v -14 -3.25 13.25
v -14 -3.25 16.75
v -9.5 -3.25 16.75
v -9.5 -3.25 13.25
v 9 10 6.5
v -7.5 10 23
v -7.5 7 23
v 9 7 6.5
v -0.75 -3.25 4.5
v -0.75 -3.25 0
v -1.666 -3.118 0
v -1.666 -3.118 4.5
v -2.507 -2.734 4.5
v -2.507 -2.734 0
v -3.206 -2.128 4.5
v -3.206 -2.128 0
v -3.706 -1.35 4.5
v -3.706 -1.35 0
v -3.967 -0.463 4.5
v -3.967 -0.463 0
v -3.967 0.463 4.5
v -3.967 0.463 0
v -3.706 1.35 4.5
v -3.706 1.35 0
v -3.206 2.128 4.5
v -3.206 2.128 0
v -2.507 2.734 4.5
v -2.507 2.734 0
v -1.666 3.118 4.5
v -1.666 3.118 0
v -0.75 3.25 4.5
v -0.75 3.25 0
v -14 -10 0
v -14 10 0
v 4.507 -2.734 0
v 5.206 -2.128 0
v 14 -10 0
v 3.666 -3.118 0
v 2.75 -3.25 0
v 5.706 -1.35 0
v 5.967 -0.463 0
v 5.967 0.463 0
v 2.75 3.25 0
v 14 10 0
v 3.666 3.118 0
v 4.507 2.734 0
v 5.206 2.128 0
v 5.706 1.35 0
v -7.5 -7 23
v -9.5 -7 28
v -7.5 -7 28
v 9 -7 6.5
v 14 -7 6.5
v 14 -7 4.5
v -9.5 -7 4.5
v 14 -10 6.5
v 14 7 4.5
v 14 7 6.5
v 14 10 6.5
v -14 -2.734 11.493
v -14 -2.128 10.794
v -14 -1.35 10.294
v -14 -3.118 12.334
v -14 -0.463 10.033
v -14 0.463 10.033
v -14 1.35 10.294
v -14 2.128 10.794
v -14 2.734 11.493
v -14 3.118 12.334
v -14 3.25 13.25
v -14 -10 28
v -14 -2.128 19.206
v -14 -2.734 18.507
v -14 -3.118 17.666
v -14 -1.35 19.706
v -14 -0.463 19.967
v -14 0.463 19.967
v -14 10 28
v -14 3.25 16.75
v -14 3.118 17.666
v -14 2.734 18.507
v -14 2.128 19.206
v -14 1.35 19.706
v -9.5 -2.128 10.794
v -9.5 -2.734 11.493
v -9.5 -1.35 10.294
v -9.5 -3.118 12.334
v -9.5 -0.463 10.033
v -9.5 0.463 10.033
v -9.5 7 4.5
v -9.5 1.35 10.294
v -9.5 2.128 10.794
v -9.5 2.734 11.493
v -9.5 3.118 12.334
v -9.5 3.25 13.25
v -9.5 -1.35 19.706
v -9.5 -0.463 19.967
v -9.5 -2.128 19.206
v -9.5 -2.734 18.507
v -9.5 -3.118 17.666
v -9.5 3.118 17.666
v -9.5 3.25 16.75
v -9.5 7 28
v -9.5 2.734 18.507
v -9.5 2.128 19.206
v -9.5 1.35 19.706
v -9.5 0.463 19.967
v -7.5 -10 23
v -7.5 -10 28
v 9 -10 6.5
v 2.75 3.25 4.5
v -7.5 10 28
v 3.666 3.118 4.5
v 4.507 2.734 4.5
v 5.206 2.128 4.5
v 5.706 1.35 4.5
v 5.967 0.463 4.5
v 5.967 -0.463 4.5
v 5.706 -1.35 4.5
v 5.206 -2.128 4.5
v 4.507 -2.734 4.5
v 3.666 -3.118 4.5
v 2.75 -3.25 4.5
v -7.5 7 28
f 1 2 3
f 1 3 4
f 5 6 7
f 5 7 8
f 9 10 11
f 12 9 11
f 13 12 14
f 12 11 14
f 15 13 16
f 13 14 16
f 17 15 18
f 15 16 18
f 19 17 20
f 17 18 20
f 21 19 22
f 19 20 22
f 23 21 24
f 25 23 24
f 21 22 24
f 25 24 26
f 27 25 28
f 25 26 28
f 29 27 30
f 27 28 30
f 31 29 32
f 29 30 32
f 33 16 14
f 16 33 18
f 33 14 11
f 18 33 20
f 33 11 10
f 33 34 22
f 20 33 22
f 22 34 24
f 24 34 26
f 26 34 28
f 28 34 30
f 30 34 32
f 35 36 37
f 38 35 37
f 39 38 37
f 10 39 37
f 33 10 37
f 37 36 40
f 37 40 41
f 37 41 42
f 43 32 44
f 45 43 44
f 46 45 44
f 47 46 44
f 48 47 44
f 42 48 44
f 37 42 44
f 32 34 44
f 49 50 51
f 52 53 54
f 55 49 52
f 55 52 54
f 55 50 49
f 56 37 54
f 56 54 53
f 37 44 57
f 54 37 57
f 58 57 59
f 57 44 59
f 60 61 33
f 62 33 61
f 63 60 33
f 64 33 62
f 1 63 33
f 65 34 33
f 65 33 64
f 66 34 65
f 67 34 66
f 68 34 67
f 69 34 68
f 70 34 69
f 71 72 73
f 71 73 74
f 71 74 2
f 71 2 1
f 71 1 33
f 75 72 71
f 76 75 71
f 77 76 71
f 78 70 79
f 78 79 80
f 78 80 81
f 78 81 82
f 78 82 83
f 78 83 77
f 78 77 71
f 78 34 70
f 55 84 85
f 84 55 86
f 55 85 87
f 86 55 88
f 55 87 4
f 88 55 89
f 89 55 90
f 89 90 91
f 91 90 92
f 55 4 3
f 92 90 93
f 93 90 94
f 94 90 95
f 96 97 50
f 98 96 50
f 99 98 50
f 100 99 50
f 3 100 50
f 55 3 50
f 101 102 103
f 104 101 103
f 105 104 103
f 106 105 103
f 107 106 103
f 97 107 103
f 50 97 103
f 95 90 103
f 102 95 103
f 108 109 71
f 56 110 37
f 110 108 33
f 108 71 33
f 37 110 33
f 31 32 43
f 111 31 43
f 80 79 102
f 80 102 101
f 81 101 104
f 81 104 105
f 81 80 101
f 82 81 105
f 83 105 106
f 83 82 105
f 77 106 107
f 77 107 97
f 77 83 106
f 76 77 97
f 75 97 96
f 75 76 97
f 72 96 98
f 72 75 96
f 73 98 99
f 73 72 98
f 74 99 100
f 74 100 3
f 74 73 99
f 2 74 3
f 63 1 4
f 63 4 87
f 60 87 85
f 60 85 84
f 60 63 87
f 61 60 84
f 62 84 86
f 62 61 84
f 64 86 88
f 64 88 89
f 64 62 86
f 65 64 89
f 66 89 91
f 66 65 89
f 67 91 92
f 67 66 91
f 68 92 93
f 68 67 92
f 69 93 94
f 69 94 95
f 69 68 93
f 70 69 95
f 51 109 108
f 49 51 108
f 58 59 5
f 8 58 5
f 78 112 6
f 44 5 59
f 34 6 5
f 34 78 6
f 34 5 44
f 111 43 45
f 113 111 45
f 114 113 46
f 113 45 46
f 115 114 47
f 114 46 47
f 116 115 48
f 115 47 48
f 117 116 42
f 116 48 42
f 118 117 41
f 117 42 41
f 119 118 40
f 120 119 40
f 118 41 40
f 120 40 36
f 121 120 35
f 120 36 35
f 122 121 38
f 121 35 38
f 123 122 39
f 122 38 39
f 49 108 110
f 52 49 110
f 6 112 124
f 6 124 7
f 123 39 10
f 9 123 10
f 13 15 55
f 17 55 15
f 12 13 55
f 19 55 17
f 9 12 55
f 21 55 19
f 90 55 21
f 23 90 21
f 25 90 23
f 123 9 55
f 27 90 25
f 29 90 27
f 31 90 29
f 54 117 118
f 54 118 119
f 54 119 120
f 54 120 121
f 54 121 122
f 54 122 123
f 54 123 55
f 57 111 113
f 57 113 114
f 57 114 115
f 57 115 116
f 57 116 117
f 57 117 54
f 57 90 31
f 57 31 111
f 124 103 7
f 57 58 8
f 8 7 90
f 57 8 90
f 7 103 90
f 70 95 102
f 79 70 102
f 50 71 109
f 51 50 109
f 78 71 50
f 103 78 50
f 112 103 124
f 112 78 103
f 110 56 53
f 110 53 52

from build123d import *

# Parameters (mm, degrees)
SKETCH1_W           = 28
SKETCH1_H           = 20
BOSS_EXTRUDE1_DEPTH = 4.5
CUT_EXTRUDE1_DEPTH  = 22
BOSS_EXTRUDE3_DEPTH = 3


with BuildPart() as part:
    # Sketch1 → Boss-Extrude1 (new body)
    with BuildSketch(Plane.XY):
        Rectangle(SKETCH1_W, SKETCH1_H)
        with BuildLine():
            Line((-0.75, 3.25), (2.75, 3.25))
            ThreePointArc((2.75, 3.25), (6, 0), (2.75, -3.25))
            Line((2.75, -3.25), (-0.75, -3.25))
            ThreePointArc((-0.75, -3.25), (-4, 0), (-0.75, 3.25))
        make_face(mode=Mode.SUBTRACT)
    extrude(amount=BOSS_EXTRUDE1_DEPTH)

    # Sketch3 → Cut-Extrude1 (cut)
    with BuildSketch(Plane(origin=(0, -10, 0), x_dir=(-1, 0, 0), z_dir=(0, -1, 0))):
        Polygon((14, 0), (9.5, -4.5), (14, -4.5), align=None)
    extrude(amount=-CUT_EXTRUDE1_DEPTH, mode=Mode.SUBTRACT)

    # Sketch4 → Boss-Extrude3 (add)
    with BuildSketch(Plane(origin=(0, -10, 0), x_dir=(-1, 0, 0), z_dir=(0, -1, 0))):
        Polygon((-14, -4.5), (-14, -6.5), (-9, -6.5), (-0.75, -14.75), (9.5, -4.5), align=None)
    boss_extrude3 = extrude(amount=-BOSS_EXTRUDE3_DEPTH)

    # Mirror1: Boss-Extrude3 across plane
    add(boss_extrude3.mirror(Plane(origin=(0, 0, 0), x_dir=(0, 0, 1), z_dir=(0, -1, 0))))

    # Mirror2: part across plane


with BuildPart() as part_1:
    add(part.part)
    add(part.part.mirror(Plane(origin=(-14, 12, 0), x_dir=(0.7071067811865476, 0, 0.7071067811865476), z_dir=(0.7071067811865477, 0, -0.7071067811865475))))


solid = part_1.part
